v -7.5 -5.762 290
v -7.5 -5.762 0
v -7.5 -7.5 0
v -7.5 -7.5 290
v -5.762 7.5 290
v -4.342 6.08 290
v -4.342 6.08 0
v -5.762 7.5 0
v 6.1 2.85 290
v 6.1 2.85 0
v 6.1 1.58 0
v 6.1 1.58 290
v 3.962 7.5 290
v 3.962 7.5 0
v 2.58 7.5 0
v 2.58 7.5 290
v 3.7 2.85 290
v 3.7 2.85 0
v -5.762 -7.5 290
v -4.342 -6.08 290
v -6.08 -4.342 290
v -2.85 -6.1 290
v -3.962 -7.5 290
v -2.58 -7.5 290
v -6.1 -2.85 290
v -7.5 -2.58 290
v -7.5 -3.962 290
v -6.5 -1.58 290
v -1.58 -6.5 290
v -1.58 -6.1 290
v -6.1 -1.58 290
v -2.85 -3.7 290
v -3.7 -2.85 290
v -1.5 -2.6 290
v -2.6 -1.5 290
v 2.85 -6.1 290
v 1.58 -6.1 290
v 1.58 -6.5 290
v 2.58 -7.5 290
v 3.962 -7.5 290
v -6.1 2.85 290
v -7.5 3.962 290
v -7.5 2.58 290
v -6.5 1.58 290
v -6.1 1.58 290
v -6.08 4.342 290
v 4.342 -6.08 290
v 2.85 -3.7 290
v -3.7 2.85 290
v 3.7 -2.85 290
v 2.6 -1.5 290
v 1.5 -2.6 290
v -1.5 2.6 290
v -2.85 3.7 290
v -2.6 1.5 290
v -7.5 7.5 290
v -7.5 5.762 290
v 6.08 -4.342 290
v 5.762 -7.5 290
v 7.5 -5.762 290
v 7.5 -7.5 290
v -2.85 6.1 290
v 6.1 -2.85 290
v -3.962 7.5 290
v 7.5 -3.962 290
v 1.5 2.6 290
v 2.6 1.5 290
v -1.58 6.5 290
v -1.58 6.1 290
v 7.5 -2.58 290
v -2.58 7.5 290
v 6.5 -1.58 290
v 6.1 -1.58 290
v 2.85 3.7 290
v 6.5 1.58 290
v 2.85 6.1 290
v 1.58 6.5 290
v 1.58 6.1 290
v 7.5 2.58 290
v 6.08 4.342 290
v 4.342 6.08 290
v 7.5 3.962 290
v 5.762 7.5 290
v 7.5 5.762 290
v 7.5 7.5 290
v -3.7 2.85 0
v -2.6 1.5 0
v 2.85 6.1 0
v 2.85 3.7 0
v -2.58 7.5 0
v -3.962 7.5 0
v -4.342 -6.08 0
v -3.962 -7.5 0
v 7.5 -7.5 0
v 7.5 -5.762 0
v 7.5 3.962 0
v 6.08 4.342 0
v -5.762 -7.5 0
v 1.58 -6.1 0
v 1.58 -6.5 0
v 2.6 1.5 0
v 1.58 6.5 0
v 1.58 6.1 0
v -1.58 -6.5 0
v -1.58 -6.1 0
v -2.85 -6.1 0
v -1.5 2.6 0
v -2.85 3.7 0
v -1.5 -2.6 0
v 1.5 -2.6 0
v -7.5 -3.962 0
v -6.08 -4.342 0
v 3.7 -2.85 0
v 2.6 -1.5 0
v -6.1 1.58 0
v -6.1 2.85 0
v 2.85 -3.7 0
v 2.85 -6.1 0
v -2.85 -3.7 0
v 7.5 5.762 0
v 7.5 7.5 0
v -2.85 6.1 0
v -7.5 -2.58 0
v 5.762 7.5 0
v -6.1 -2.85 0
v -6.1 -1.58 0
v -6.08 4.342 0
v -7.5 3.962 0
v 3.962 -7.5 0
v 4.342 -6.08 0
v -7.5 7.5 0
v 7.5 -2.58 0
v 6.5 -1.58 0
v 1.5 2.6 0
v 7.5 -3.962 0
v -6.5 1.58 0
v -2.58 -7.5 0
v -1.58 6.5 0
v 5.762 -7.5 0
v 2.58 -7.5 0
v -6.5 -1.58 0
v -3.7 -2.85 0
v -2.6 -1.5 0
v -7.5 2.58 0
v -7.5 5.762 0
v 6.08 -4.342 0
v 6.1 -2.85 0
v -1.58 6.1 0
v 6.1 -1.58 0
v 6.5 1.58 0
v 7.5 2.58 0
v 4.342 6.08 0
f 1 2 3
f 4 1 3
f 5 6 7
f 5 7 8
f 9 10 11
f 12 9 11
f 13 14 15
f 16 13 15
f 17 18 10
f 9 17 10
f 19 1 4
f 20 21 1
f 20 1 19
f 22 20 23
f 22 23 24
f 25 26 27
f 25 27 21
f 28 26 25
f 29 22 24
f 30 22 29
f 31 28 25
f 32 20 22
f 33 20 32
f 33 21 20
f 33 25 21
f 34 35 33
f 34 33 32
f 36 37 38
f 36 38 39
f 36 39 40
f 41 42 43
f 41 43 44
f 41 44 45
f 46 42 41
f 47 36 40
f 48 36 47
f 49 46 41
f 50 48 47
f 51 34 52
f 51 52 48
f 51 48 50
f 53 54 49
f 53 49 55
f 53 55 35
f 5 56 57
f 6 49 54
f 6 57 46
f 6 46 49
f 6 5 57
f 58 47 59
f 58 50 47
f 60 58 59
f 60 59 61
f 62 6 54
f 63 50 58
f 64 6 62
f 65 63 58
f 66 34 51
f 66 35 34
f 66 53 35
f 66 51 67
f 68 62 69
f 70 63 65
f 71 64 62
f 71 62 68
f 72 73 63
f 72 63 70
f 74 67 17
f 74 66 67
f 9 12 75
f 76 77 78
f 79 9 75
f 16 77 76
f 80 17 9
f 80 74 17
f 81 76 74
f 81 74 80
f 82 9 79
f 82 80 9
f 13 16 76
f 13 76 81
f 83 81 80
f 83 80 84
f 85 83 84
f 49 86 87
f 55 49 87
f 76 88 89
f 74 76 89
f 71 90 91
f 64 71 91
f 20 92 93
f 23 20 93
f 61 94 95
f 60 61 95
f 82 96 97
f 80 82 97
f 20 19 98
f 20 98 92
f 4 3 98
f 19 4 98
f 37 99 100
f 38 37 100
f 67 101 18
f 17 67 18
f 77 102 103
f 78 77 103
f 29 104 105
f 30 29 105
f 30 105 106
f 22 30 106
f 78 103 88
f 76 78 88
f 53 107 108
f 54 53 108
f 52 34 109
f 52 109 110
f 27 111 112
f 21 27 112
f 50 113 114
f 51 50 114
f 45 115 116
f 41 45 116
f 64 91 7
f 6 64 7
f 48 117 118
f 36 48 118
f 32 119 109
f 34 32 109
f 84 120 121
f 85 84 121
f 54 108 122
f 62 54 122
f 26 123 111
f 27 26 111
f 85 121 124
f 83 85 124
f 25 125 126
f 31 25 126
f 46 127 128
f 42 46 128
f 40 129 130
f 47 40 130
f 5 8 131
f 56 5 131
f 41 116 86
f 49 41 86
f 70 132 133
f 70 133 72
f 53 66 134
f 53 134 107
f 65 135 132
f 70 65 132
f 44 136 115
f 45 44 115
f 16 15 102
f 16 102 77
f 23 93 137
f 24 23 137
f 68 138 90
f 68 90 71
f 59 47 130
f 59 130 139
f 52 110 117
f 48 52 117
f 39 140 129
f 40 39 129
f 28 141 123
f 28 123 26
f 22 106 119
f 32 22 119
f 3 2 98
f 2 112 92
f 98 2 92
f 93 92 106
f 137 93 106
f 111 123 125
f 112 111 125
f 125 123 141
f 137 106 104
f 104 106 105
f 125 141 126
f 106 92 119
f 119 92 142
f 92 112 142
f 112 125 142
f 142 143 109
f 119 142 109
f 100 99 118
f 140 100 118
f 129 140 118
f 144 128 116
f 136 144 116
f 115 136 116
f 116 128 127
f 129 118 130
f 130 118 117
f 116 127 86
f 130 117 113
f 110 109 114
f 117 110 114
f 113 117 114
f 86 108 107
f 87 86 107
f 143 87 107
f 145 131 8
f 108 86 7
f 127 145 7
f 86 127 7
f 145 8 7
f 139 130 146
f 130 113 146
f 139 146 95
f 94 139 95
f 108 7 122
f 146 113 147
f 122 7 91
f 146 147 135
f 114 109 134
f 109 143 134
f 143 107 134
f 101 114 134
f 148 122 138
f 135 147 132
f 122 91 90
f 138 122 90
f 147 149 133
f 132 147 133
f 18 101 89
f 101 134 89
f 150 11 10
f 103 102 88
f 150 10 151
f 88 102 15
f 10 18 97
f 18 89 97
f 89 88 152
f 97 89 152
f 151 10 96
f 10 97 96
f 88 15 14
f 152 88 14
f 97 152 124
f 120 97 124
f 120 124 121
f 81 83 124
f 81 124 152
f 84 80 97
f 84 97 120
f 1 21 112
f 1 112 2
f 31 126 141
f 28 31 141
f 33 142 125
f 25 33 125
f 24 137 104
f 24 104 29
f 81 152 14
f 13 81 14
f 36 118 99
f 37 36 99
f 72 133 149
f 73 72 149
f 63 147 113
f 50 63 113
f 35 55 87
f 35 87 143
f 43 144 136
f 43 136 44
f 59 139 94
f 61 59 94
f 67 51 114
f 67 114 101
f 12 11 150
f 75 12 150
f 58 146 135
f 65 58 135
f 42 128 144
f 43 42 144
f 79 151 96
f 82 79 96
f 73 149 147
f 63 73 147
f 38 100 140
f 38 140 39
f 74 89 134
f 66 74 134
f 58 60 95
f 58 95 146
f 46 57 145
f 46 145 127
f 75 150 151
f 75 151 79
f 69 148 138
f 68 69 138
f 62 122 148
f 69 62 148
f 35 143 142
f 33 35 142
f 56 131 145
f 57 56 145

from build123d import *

# Parameters (mm, degrees)
EXTRUDE_1_DEPTH     = 290
CUT_EXTRUDE_1_DEPTH = 291.193900694
CHAMFER_1_SIZE      = 1


with BuildPart() as part:
    # Эскиз1 → Бобышка-Вытянуть1 (new body)
    with BuildSketch(Plane.XY):
        Polygon((1.58, 7.5), (1.58, 6.1), (2.85, 6.1), (2.85, 3.7), (-2.85, 3.7), (-2.85, 6.1), (-1.58, 6.1), (-1.58, 7.5), (-3.962017091, 7.5), (-4.342017091, 6.08), (-5.762017091, 7.5), (-7.5, 7.5), (-7.5, 5.762017091), (-6.08, 4.342017091), (-7.5, 3.962017091), (-7.5, 1.58), (-6.1, 1.58), (-6.1, 2.85), (-3.7, 2.85), (-3.7, -2.85), (-6.1, -2.85), (-6.1, -1.58), (-7.5, -1.58), (-7.5, -3.962017091), (-6.08, -4.342017091), (-7.5, -5.762017091), (-7.5, -7.5), (-5.762017091, -7.5), (-4.342017091, -6.08), (-3.962017091, -7.5), (-1.58, -7.5), (-1.58, -6.1), (-2.85, -6.1), (-2.85, -3.7), (2.85, -3.7), (2.85, -6.1), (1.58, -6.1), (1.58, -7.5), (3.962017091, -7.5), (4.342017091, -6.08), (5.762017091, -7.5), (7.5, -7.5), (7.5, -5.762017091), (6.08, -4.342017091), (7.5, -3.962017091), (7.5, -1.58), (6.1, -1.58), (6.1, -2.85), (3.7, -2.85), (3.7, 2.85), (6.1, 2.85), (6.1, 1.58), (7.5, 1.58), (7.5, 3.962017091), (6.08, 4.342017091), (7.5, 5.762017091), (7.5, 7.5), (5.762017091, 7.5), (4.342017091, 6.08), (3.962017091, 7.5), align=None)
    extrude(amount=EXTRUDE_1_DEPTH)

    # Эскиз2 → Вырез-Вытянуть1 (cut, through all)
    with BuildSketch(Plane.XY.offset(290)):
        Polygon((-3.7, 2.85), (-2.6, 1.5), (-2.6, -1.5), (-3.7, -2.85), align=None)
        Polygon((2.85, 3.7), (1.5, 2.6), (-1.5, 2.6), (-2.85, 3.7), align=None)
        Polygon((3.7, -2.85), (2.6, -1.5), (2.6, 1.5), (3.7, 2.85), align=None)
        Polygon((-2.85, -3.7), (-1.5, -2.6), (1.5, -2.6), (2.85, -3.7), align=None)
    extrude(amount=-CUT_EXTRUDE_1_DEPTH, mode=Mode.SUBTRACT)

    # Фаска1
    chamfer_1_edges = [part.edges().sort_by_distance(p)[0] for p in [
        (-7.5, -1.58, 145),
        (-7.5, 1.58, 145),
        (-1.58, 7.5, 145),
        (1.58, 7.5, 145),
        (7.5, 1.58, 145),
        (7.5, -1.58, 145),
        (1.58, -7.5, 145),
        (-1.58, -7.5, 145),
    ]]
    chamfer(chamfer_1_edges, length=CHAMFER_1_SIZE)


solid = part.part
